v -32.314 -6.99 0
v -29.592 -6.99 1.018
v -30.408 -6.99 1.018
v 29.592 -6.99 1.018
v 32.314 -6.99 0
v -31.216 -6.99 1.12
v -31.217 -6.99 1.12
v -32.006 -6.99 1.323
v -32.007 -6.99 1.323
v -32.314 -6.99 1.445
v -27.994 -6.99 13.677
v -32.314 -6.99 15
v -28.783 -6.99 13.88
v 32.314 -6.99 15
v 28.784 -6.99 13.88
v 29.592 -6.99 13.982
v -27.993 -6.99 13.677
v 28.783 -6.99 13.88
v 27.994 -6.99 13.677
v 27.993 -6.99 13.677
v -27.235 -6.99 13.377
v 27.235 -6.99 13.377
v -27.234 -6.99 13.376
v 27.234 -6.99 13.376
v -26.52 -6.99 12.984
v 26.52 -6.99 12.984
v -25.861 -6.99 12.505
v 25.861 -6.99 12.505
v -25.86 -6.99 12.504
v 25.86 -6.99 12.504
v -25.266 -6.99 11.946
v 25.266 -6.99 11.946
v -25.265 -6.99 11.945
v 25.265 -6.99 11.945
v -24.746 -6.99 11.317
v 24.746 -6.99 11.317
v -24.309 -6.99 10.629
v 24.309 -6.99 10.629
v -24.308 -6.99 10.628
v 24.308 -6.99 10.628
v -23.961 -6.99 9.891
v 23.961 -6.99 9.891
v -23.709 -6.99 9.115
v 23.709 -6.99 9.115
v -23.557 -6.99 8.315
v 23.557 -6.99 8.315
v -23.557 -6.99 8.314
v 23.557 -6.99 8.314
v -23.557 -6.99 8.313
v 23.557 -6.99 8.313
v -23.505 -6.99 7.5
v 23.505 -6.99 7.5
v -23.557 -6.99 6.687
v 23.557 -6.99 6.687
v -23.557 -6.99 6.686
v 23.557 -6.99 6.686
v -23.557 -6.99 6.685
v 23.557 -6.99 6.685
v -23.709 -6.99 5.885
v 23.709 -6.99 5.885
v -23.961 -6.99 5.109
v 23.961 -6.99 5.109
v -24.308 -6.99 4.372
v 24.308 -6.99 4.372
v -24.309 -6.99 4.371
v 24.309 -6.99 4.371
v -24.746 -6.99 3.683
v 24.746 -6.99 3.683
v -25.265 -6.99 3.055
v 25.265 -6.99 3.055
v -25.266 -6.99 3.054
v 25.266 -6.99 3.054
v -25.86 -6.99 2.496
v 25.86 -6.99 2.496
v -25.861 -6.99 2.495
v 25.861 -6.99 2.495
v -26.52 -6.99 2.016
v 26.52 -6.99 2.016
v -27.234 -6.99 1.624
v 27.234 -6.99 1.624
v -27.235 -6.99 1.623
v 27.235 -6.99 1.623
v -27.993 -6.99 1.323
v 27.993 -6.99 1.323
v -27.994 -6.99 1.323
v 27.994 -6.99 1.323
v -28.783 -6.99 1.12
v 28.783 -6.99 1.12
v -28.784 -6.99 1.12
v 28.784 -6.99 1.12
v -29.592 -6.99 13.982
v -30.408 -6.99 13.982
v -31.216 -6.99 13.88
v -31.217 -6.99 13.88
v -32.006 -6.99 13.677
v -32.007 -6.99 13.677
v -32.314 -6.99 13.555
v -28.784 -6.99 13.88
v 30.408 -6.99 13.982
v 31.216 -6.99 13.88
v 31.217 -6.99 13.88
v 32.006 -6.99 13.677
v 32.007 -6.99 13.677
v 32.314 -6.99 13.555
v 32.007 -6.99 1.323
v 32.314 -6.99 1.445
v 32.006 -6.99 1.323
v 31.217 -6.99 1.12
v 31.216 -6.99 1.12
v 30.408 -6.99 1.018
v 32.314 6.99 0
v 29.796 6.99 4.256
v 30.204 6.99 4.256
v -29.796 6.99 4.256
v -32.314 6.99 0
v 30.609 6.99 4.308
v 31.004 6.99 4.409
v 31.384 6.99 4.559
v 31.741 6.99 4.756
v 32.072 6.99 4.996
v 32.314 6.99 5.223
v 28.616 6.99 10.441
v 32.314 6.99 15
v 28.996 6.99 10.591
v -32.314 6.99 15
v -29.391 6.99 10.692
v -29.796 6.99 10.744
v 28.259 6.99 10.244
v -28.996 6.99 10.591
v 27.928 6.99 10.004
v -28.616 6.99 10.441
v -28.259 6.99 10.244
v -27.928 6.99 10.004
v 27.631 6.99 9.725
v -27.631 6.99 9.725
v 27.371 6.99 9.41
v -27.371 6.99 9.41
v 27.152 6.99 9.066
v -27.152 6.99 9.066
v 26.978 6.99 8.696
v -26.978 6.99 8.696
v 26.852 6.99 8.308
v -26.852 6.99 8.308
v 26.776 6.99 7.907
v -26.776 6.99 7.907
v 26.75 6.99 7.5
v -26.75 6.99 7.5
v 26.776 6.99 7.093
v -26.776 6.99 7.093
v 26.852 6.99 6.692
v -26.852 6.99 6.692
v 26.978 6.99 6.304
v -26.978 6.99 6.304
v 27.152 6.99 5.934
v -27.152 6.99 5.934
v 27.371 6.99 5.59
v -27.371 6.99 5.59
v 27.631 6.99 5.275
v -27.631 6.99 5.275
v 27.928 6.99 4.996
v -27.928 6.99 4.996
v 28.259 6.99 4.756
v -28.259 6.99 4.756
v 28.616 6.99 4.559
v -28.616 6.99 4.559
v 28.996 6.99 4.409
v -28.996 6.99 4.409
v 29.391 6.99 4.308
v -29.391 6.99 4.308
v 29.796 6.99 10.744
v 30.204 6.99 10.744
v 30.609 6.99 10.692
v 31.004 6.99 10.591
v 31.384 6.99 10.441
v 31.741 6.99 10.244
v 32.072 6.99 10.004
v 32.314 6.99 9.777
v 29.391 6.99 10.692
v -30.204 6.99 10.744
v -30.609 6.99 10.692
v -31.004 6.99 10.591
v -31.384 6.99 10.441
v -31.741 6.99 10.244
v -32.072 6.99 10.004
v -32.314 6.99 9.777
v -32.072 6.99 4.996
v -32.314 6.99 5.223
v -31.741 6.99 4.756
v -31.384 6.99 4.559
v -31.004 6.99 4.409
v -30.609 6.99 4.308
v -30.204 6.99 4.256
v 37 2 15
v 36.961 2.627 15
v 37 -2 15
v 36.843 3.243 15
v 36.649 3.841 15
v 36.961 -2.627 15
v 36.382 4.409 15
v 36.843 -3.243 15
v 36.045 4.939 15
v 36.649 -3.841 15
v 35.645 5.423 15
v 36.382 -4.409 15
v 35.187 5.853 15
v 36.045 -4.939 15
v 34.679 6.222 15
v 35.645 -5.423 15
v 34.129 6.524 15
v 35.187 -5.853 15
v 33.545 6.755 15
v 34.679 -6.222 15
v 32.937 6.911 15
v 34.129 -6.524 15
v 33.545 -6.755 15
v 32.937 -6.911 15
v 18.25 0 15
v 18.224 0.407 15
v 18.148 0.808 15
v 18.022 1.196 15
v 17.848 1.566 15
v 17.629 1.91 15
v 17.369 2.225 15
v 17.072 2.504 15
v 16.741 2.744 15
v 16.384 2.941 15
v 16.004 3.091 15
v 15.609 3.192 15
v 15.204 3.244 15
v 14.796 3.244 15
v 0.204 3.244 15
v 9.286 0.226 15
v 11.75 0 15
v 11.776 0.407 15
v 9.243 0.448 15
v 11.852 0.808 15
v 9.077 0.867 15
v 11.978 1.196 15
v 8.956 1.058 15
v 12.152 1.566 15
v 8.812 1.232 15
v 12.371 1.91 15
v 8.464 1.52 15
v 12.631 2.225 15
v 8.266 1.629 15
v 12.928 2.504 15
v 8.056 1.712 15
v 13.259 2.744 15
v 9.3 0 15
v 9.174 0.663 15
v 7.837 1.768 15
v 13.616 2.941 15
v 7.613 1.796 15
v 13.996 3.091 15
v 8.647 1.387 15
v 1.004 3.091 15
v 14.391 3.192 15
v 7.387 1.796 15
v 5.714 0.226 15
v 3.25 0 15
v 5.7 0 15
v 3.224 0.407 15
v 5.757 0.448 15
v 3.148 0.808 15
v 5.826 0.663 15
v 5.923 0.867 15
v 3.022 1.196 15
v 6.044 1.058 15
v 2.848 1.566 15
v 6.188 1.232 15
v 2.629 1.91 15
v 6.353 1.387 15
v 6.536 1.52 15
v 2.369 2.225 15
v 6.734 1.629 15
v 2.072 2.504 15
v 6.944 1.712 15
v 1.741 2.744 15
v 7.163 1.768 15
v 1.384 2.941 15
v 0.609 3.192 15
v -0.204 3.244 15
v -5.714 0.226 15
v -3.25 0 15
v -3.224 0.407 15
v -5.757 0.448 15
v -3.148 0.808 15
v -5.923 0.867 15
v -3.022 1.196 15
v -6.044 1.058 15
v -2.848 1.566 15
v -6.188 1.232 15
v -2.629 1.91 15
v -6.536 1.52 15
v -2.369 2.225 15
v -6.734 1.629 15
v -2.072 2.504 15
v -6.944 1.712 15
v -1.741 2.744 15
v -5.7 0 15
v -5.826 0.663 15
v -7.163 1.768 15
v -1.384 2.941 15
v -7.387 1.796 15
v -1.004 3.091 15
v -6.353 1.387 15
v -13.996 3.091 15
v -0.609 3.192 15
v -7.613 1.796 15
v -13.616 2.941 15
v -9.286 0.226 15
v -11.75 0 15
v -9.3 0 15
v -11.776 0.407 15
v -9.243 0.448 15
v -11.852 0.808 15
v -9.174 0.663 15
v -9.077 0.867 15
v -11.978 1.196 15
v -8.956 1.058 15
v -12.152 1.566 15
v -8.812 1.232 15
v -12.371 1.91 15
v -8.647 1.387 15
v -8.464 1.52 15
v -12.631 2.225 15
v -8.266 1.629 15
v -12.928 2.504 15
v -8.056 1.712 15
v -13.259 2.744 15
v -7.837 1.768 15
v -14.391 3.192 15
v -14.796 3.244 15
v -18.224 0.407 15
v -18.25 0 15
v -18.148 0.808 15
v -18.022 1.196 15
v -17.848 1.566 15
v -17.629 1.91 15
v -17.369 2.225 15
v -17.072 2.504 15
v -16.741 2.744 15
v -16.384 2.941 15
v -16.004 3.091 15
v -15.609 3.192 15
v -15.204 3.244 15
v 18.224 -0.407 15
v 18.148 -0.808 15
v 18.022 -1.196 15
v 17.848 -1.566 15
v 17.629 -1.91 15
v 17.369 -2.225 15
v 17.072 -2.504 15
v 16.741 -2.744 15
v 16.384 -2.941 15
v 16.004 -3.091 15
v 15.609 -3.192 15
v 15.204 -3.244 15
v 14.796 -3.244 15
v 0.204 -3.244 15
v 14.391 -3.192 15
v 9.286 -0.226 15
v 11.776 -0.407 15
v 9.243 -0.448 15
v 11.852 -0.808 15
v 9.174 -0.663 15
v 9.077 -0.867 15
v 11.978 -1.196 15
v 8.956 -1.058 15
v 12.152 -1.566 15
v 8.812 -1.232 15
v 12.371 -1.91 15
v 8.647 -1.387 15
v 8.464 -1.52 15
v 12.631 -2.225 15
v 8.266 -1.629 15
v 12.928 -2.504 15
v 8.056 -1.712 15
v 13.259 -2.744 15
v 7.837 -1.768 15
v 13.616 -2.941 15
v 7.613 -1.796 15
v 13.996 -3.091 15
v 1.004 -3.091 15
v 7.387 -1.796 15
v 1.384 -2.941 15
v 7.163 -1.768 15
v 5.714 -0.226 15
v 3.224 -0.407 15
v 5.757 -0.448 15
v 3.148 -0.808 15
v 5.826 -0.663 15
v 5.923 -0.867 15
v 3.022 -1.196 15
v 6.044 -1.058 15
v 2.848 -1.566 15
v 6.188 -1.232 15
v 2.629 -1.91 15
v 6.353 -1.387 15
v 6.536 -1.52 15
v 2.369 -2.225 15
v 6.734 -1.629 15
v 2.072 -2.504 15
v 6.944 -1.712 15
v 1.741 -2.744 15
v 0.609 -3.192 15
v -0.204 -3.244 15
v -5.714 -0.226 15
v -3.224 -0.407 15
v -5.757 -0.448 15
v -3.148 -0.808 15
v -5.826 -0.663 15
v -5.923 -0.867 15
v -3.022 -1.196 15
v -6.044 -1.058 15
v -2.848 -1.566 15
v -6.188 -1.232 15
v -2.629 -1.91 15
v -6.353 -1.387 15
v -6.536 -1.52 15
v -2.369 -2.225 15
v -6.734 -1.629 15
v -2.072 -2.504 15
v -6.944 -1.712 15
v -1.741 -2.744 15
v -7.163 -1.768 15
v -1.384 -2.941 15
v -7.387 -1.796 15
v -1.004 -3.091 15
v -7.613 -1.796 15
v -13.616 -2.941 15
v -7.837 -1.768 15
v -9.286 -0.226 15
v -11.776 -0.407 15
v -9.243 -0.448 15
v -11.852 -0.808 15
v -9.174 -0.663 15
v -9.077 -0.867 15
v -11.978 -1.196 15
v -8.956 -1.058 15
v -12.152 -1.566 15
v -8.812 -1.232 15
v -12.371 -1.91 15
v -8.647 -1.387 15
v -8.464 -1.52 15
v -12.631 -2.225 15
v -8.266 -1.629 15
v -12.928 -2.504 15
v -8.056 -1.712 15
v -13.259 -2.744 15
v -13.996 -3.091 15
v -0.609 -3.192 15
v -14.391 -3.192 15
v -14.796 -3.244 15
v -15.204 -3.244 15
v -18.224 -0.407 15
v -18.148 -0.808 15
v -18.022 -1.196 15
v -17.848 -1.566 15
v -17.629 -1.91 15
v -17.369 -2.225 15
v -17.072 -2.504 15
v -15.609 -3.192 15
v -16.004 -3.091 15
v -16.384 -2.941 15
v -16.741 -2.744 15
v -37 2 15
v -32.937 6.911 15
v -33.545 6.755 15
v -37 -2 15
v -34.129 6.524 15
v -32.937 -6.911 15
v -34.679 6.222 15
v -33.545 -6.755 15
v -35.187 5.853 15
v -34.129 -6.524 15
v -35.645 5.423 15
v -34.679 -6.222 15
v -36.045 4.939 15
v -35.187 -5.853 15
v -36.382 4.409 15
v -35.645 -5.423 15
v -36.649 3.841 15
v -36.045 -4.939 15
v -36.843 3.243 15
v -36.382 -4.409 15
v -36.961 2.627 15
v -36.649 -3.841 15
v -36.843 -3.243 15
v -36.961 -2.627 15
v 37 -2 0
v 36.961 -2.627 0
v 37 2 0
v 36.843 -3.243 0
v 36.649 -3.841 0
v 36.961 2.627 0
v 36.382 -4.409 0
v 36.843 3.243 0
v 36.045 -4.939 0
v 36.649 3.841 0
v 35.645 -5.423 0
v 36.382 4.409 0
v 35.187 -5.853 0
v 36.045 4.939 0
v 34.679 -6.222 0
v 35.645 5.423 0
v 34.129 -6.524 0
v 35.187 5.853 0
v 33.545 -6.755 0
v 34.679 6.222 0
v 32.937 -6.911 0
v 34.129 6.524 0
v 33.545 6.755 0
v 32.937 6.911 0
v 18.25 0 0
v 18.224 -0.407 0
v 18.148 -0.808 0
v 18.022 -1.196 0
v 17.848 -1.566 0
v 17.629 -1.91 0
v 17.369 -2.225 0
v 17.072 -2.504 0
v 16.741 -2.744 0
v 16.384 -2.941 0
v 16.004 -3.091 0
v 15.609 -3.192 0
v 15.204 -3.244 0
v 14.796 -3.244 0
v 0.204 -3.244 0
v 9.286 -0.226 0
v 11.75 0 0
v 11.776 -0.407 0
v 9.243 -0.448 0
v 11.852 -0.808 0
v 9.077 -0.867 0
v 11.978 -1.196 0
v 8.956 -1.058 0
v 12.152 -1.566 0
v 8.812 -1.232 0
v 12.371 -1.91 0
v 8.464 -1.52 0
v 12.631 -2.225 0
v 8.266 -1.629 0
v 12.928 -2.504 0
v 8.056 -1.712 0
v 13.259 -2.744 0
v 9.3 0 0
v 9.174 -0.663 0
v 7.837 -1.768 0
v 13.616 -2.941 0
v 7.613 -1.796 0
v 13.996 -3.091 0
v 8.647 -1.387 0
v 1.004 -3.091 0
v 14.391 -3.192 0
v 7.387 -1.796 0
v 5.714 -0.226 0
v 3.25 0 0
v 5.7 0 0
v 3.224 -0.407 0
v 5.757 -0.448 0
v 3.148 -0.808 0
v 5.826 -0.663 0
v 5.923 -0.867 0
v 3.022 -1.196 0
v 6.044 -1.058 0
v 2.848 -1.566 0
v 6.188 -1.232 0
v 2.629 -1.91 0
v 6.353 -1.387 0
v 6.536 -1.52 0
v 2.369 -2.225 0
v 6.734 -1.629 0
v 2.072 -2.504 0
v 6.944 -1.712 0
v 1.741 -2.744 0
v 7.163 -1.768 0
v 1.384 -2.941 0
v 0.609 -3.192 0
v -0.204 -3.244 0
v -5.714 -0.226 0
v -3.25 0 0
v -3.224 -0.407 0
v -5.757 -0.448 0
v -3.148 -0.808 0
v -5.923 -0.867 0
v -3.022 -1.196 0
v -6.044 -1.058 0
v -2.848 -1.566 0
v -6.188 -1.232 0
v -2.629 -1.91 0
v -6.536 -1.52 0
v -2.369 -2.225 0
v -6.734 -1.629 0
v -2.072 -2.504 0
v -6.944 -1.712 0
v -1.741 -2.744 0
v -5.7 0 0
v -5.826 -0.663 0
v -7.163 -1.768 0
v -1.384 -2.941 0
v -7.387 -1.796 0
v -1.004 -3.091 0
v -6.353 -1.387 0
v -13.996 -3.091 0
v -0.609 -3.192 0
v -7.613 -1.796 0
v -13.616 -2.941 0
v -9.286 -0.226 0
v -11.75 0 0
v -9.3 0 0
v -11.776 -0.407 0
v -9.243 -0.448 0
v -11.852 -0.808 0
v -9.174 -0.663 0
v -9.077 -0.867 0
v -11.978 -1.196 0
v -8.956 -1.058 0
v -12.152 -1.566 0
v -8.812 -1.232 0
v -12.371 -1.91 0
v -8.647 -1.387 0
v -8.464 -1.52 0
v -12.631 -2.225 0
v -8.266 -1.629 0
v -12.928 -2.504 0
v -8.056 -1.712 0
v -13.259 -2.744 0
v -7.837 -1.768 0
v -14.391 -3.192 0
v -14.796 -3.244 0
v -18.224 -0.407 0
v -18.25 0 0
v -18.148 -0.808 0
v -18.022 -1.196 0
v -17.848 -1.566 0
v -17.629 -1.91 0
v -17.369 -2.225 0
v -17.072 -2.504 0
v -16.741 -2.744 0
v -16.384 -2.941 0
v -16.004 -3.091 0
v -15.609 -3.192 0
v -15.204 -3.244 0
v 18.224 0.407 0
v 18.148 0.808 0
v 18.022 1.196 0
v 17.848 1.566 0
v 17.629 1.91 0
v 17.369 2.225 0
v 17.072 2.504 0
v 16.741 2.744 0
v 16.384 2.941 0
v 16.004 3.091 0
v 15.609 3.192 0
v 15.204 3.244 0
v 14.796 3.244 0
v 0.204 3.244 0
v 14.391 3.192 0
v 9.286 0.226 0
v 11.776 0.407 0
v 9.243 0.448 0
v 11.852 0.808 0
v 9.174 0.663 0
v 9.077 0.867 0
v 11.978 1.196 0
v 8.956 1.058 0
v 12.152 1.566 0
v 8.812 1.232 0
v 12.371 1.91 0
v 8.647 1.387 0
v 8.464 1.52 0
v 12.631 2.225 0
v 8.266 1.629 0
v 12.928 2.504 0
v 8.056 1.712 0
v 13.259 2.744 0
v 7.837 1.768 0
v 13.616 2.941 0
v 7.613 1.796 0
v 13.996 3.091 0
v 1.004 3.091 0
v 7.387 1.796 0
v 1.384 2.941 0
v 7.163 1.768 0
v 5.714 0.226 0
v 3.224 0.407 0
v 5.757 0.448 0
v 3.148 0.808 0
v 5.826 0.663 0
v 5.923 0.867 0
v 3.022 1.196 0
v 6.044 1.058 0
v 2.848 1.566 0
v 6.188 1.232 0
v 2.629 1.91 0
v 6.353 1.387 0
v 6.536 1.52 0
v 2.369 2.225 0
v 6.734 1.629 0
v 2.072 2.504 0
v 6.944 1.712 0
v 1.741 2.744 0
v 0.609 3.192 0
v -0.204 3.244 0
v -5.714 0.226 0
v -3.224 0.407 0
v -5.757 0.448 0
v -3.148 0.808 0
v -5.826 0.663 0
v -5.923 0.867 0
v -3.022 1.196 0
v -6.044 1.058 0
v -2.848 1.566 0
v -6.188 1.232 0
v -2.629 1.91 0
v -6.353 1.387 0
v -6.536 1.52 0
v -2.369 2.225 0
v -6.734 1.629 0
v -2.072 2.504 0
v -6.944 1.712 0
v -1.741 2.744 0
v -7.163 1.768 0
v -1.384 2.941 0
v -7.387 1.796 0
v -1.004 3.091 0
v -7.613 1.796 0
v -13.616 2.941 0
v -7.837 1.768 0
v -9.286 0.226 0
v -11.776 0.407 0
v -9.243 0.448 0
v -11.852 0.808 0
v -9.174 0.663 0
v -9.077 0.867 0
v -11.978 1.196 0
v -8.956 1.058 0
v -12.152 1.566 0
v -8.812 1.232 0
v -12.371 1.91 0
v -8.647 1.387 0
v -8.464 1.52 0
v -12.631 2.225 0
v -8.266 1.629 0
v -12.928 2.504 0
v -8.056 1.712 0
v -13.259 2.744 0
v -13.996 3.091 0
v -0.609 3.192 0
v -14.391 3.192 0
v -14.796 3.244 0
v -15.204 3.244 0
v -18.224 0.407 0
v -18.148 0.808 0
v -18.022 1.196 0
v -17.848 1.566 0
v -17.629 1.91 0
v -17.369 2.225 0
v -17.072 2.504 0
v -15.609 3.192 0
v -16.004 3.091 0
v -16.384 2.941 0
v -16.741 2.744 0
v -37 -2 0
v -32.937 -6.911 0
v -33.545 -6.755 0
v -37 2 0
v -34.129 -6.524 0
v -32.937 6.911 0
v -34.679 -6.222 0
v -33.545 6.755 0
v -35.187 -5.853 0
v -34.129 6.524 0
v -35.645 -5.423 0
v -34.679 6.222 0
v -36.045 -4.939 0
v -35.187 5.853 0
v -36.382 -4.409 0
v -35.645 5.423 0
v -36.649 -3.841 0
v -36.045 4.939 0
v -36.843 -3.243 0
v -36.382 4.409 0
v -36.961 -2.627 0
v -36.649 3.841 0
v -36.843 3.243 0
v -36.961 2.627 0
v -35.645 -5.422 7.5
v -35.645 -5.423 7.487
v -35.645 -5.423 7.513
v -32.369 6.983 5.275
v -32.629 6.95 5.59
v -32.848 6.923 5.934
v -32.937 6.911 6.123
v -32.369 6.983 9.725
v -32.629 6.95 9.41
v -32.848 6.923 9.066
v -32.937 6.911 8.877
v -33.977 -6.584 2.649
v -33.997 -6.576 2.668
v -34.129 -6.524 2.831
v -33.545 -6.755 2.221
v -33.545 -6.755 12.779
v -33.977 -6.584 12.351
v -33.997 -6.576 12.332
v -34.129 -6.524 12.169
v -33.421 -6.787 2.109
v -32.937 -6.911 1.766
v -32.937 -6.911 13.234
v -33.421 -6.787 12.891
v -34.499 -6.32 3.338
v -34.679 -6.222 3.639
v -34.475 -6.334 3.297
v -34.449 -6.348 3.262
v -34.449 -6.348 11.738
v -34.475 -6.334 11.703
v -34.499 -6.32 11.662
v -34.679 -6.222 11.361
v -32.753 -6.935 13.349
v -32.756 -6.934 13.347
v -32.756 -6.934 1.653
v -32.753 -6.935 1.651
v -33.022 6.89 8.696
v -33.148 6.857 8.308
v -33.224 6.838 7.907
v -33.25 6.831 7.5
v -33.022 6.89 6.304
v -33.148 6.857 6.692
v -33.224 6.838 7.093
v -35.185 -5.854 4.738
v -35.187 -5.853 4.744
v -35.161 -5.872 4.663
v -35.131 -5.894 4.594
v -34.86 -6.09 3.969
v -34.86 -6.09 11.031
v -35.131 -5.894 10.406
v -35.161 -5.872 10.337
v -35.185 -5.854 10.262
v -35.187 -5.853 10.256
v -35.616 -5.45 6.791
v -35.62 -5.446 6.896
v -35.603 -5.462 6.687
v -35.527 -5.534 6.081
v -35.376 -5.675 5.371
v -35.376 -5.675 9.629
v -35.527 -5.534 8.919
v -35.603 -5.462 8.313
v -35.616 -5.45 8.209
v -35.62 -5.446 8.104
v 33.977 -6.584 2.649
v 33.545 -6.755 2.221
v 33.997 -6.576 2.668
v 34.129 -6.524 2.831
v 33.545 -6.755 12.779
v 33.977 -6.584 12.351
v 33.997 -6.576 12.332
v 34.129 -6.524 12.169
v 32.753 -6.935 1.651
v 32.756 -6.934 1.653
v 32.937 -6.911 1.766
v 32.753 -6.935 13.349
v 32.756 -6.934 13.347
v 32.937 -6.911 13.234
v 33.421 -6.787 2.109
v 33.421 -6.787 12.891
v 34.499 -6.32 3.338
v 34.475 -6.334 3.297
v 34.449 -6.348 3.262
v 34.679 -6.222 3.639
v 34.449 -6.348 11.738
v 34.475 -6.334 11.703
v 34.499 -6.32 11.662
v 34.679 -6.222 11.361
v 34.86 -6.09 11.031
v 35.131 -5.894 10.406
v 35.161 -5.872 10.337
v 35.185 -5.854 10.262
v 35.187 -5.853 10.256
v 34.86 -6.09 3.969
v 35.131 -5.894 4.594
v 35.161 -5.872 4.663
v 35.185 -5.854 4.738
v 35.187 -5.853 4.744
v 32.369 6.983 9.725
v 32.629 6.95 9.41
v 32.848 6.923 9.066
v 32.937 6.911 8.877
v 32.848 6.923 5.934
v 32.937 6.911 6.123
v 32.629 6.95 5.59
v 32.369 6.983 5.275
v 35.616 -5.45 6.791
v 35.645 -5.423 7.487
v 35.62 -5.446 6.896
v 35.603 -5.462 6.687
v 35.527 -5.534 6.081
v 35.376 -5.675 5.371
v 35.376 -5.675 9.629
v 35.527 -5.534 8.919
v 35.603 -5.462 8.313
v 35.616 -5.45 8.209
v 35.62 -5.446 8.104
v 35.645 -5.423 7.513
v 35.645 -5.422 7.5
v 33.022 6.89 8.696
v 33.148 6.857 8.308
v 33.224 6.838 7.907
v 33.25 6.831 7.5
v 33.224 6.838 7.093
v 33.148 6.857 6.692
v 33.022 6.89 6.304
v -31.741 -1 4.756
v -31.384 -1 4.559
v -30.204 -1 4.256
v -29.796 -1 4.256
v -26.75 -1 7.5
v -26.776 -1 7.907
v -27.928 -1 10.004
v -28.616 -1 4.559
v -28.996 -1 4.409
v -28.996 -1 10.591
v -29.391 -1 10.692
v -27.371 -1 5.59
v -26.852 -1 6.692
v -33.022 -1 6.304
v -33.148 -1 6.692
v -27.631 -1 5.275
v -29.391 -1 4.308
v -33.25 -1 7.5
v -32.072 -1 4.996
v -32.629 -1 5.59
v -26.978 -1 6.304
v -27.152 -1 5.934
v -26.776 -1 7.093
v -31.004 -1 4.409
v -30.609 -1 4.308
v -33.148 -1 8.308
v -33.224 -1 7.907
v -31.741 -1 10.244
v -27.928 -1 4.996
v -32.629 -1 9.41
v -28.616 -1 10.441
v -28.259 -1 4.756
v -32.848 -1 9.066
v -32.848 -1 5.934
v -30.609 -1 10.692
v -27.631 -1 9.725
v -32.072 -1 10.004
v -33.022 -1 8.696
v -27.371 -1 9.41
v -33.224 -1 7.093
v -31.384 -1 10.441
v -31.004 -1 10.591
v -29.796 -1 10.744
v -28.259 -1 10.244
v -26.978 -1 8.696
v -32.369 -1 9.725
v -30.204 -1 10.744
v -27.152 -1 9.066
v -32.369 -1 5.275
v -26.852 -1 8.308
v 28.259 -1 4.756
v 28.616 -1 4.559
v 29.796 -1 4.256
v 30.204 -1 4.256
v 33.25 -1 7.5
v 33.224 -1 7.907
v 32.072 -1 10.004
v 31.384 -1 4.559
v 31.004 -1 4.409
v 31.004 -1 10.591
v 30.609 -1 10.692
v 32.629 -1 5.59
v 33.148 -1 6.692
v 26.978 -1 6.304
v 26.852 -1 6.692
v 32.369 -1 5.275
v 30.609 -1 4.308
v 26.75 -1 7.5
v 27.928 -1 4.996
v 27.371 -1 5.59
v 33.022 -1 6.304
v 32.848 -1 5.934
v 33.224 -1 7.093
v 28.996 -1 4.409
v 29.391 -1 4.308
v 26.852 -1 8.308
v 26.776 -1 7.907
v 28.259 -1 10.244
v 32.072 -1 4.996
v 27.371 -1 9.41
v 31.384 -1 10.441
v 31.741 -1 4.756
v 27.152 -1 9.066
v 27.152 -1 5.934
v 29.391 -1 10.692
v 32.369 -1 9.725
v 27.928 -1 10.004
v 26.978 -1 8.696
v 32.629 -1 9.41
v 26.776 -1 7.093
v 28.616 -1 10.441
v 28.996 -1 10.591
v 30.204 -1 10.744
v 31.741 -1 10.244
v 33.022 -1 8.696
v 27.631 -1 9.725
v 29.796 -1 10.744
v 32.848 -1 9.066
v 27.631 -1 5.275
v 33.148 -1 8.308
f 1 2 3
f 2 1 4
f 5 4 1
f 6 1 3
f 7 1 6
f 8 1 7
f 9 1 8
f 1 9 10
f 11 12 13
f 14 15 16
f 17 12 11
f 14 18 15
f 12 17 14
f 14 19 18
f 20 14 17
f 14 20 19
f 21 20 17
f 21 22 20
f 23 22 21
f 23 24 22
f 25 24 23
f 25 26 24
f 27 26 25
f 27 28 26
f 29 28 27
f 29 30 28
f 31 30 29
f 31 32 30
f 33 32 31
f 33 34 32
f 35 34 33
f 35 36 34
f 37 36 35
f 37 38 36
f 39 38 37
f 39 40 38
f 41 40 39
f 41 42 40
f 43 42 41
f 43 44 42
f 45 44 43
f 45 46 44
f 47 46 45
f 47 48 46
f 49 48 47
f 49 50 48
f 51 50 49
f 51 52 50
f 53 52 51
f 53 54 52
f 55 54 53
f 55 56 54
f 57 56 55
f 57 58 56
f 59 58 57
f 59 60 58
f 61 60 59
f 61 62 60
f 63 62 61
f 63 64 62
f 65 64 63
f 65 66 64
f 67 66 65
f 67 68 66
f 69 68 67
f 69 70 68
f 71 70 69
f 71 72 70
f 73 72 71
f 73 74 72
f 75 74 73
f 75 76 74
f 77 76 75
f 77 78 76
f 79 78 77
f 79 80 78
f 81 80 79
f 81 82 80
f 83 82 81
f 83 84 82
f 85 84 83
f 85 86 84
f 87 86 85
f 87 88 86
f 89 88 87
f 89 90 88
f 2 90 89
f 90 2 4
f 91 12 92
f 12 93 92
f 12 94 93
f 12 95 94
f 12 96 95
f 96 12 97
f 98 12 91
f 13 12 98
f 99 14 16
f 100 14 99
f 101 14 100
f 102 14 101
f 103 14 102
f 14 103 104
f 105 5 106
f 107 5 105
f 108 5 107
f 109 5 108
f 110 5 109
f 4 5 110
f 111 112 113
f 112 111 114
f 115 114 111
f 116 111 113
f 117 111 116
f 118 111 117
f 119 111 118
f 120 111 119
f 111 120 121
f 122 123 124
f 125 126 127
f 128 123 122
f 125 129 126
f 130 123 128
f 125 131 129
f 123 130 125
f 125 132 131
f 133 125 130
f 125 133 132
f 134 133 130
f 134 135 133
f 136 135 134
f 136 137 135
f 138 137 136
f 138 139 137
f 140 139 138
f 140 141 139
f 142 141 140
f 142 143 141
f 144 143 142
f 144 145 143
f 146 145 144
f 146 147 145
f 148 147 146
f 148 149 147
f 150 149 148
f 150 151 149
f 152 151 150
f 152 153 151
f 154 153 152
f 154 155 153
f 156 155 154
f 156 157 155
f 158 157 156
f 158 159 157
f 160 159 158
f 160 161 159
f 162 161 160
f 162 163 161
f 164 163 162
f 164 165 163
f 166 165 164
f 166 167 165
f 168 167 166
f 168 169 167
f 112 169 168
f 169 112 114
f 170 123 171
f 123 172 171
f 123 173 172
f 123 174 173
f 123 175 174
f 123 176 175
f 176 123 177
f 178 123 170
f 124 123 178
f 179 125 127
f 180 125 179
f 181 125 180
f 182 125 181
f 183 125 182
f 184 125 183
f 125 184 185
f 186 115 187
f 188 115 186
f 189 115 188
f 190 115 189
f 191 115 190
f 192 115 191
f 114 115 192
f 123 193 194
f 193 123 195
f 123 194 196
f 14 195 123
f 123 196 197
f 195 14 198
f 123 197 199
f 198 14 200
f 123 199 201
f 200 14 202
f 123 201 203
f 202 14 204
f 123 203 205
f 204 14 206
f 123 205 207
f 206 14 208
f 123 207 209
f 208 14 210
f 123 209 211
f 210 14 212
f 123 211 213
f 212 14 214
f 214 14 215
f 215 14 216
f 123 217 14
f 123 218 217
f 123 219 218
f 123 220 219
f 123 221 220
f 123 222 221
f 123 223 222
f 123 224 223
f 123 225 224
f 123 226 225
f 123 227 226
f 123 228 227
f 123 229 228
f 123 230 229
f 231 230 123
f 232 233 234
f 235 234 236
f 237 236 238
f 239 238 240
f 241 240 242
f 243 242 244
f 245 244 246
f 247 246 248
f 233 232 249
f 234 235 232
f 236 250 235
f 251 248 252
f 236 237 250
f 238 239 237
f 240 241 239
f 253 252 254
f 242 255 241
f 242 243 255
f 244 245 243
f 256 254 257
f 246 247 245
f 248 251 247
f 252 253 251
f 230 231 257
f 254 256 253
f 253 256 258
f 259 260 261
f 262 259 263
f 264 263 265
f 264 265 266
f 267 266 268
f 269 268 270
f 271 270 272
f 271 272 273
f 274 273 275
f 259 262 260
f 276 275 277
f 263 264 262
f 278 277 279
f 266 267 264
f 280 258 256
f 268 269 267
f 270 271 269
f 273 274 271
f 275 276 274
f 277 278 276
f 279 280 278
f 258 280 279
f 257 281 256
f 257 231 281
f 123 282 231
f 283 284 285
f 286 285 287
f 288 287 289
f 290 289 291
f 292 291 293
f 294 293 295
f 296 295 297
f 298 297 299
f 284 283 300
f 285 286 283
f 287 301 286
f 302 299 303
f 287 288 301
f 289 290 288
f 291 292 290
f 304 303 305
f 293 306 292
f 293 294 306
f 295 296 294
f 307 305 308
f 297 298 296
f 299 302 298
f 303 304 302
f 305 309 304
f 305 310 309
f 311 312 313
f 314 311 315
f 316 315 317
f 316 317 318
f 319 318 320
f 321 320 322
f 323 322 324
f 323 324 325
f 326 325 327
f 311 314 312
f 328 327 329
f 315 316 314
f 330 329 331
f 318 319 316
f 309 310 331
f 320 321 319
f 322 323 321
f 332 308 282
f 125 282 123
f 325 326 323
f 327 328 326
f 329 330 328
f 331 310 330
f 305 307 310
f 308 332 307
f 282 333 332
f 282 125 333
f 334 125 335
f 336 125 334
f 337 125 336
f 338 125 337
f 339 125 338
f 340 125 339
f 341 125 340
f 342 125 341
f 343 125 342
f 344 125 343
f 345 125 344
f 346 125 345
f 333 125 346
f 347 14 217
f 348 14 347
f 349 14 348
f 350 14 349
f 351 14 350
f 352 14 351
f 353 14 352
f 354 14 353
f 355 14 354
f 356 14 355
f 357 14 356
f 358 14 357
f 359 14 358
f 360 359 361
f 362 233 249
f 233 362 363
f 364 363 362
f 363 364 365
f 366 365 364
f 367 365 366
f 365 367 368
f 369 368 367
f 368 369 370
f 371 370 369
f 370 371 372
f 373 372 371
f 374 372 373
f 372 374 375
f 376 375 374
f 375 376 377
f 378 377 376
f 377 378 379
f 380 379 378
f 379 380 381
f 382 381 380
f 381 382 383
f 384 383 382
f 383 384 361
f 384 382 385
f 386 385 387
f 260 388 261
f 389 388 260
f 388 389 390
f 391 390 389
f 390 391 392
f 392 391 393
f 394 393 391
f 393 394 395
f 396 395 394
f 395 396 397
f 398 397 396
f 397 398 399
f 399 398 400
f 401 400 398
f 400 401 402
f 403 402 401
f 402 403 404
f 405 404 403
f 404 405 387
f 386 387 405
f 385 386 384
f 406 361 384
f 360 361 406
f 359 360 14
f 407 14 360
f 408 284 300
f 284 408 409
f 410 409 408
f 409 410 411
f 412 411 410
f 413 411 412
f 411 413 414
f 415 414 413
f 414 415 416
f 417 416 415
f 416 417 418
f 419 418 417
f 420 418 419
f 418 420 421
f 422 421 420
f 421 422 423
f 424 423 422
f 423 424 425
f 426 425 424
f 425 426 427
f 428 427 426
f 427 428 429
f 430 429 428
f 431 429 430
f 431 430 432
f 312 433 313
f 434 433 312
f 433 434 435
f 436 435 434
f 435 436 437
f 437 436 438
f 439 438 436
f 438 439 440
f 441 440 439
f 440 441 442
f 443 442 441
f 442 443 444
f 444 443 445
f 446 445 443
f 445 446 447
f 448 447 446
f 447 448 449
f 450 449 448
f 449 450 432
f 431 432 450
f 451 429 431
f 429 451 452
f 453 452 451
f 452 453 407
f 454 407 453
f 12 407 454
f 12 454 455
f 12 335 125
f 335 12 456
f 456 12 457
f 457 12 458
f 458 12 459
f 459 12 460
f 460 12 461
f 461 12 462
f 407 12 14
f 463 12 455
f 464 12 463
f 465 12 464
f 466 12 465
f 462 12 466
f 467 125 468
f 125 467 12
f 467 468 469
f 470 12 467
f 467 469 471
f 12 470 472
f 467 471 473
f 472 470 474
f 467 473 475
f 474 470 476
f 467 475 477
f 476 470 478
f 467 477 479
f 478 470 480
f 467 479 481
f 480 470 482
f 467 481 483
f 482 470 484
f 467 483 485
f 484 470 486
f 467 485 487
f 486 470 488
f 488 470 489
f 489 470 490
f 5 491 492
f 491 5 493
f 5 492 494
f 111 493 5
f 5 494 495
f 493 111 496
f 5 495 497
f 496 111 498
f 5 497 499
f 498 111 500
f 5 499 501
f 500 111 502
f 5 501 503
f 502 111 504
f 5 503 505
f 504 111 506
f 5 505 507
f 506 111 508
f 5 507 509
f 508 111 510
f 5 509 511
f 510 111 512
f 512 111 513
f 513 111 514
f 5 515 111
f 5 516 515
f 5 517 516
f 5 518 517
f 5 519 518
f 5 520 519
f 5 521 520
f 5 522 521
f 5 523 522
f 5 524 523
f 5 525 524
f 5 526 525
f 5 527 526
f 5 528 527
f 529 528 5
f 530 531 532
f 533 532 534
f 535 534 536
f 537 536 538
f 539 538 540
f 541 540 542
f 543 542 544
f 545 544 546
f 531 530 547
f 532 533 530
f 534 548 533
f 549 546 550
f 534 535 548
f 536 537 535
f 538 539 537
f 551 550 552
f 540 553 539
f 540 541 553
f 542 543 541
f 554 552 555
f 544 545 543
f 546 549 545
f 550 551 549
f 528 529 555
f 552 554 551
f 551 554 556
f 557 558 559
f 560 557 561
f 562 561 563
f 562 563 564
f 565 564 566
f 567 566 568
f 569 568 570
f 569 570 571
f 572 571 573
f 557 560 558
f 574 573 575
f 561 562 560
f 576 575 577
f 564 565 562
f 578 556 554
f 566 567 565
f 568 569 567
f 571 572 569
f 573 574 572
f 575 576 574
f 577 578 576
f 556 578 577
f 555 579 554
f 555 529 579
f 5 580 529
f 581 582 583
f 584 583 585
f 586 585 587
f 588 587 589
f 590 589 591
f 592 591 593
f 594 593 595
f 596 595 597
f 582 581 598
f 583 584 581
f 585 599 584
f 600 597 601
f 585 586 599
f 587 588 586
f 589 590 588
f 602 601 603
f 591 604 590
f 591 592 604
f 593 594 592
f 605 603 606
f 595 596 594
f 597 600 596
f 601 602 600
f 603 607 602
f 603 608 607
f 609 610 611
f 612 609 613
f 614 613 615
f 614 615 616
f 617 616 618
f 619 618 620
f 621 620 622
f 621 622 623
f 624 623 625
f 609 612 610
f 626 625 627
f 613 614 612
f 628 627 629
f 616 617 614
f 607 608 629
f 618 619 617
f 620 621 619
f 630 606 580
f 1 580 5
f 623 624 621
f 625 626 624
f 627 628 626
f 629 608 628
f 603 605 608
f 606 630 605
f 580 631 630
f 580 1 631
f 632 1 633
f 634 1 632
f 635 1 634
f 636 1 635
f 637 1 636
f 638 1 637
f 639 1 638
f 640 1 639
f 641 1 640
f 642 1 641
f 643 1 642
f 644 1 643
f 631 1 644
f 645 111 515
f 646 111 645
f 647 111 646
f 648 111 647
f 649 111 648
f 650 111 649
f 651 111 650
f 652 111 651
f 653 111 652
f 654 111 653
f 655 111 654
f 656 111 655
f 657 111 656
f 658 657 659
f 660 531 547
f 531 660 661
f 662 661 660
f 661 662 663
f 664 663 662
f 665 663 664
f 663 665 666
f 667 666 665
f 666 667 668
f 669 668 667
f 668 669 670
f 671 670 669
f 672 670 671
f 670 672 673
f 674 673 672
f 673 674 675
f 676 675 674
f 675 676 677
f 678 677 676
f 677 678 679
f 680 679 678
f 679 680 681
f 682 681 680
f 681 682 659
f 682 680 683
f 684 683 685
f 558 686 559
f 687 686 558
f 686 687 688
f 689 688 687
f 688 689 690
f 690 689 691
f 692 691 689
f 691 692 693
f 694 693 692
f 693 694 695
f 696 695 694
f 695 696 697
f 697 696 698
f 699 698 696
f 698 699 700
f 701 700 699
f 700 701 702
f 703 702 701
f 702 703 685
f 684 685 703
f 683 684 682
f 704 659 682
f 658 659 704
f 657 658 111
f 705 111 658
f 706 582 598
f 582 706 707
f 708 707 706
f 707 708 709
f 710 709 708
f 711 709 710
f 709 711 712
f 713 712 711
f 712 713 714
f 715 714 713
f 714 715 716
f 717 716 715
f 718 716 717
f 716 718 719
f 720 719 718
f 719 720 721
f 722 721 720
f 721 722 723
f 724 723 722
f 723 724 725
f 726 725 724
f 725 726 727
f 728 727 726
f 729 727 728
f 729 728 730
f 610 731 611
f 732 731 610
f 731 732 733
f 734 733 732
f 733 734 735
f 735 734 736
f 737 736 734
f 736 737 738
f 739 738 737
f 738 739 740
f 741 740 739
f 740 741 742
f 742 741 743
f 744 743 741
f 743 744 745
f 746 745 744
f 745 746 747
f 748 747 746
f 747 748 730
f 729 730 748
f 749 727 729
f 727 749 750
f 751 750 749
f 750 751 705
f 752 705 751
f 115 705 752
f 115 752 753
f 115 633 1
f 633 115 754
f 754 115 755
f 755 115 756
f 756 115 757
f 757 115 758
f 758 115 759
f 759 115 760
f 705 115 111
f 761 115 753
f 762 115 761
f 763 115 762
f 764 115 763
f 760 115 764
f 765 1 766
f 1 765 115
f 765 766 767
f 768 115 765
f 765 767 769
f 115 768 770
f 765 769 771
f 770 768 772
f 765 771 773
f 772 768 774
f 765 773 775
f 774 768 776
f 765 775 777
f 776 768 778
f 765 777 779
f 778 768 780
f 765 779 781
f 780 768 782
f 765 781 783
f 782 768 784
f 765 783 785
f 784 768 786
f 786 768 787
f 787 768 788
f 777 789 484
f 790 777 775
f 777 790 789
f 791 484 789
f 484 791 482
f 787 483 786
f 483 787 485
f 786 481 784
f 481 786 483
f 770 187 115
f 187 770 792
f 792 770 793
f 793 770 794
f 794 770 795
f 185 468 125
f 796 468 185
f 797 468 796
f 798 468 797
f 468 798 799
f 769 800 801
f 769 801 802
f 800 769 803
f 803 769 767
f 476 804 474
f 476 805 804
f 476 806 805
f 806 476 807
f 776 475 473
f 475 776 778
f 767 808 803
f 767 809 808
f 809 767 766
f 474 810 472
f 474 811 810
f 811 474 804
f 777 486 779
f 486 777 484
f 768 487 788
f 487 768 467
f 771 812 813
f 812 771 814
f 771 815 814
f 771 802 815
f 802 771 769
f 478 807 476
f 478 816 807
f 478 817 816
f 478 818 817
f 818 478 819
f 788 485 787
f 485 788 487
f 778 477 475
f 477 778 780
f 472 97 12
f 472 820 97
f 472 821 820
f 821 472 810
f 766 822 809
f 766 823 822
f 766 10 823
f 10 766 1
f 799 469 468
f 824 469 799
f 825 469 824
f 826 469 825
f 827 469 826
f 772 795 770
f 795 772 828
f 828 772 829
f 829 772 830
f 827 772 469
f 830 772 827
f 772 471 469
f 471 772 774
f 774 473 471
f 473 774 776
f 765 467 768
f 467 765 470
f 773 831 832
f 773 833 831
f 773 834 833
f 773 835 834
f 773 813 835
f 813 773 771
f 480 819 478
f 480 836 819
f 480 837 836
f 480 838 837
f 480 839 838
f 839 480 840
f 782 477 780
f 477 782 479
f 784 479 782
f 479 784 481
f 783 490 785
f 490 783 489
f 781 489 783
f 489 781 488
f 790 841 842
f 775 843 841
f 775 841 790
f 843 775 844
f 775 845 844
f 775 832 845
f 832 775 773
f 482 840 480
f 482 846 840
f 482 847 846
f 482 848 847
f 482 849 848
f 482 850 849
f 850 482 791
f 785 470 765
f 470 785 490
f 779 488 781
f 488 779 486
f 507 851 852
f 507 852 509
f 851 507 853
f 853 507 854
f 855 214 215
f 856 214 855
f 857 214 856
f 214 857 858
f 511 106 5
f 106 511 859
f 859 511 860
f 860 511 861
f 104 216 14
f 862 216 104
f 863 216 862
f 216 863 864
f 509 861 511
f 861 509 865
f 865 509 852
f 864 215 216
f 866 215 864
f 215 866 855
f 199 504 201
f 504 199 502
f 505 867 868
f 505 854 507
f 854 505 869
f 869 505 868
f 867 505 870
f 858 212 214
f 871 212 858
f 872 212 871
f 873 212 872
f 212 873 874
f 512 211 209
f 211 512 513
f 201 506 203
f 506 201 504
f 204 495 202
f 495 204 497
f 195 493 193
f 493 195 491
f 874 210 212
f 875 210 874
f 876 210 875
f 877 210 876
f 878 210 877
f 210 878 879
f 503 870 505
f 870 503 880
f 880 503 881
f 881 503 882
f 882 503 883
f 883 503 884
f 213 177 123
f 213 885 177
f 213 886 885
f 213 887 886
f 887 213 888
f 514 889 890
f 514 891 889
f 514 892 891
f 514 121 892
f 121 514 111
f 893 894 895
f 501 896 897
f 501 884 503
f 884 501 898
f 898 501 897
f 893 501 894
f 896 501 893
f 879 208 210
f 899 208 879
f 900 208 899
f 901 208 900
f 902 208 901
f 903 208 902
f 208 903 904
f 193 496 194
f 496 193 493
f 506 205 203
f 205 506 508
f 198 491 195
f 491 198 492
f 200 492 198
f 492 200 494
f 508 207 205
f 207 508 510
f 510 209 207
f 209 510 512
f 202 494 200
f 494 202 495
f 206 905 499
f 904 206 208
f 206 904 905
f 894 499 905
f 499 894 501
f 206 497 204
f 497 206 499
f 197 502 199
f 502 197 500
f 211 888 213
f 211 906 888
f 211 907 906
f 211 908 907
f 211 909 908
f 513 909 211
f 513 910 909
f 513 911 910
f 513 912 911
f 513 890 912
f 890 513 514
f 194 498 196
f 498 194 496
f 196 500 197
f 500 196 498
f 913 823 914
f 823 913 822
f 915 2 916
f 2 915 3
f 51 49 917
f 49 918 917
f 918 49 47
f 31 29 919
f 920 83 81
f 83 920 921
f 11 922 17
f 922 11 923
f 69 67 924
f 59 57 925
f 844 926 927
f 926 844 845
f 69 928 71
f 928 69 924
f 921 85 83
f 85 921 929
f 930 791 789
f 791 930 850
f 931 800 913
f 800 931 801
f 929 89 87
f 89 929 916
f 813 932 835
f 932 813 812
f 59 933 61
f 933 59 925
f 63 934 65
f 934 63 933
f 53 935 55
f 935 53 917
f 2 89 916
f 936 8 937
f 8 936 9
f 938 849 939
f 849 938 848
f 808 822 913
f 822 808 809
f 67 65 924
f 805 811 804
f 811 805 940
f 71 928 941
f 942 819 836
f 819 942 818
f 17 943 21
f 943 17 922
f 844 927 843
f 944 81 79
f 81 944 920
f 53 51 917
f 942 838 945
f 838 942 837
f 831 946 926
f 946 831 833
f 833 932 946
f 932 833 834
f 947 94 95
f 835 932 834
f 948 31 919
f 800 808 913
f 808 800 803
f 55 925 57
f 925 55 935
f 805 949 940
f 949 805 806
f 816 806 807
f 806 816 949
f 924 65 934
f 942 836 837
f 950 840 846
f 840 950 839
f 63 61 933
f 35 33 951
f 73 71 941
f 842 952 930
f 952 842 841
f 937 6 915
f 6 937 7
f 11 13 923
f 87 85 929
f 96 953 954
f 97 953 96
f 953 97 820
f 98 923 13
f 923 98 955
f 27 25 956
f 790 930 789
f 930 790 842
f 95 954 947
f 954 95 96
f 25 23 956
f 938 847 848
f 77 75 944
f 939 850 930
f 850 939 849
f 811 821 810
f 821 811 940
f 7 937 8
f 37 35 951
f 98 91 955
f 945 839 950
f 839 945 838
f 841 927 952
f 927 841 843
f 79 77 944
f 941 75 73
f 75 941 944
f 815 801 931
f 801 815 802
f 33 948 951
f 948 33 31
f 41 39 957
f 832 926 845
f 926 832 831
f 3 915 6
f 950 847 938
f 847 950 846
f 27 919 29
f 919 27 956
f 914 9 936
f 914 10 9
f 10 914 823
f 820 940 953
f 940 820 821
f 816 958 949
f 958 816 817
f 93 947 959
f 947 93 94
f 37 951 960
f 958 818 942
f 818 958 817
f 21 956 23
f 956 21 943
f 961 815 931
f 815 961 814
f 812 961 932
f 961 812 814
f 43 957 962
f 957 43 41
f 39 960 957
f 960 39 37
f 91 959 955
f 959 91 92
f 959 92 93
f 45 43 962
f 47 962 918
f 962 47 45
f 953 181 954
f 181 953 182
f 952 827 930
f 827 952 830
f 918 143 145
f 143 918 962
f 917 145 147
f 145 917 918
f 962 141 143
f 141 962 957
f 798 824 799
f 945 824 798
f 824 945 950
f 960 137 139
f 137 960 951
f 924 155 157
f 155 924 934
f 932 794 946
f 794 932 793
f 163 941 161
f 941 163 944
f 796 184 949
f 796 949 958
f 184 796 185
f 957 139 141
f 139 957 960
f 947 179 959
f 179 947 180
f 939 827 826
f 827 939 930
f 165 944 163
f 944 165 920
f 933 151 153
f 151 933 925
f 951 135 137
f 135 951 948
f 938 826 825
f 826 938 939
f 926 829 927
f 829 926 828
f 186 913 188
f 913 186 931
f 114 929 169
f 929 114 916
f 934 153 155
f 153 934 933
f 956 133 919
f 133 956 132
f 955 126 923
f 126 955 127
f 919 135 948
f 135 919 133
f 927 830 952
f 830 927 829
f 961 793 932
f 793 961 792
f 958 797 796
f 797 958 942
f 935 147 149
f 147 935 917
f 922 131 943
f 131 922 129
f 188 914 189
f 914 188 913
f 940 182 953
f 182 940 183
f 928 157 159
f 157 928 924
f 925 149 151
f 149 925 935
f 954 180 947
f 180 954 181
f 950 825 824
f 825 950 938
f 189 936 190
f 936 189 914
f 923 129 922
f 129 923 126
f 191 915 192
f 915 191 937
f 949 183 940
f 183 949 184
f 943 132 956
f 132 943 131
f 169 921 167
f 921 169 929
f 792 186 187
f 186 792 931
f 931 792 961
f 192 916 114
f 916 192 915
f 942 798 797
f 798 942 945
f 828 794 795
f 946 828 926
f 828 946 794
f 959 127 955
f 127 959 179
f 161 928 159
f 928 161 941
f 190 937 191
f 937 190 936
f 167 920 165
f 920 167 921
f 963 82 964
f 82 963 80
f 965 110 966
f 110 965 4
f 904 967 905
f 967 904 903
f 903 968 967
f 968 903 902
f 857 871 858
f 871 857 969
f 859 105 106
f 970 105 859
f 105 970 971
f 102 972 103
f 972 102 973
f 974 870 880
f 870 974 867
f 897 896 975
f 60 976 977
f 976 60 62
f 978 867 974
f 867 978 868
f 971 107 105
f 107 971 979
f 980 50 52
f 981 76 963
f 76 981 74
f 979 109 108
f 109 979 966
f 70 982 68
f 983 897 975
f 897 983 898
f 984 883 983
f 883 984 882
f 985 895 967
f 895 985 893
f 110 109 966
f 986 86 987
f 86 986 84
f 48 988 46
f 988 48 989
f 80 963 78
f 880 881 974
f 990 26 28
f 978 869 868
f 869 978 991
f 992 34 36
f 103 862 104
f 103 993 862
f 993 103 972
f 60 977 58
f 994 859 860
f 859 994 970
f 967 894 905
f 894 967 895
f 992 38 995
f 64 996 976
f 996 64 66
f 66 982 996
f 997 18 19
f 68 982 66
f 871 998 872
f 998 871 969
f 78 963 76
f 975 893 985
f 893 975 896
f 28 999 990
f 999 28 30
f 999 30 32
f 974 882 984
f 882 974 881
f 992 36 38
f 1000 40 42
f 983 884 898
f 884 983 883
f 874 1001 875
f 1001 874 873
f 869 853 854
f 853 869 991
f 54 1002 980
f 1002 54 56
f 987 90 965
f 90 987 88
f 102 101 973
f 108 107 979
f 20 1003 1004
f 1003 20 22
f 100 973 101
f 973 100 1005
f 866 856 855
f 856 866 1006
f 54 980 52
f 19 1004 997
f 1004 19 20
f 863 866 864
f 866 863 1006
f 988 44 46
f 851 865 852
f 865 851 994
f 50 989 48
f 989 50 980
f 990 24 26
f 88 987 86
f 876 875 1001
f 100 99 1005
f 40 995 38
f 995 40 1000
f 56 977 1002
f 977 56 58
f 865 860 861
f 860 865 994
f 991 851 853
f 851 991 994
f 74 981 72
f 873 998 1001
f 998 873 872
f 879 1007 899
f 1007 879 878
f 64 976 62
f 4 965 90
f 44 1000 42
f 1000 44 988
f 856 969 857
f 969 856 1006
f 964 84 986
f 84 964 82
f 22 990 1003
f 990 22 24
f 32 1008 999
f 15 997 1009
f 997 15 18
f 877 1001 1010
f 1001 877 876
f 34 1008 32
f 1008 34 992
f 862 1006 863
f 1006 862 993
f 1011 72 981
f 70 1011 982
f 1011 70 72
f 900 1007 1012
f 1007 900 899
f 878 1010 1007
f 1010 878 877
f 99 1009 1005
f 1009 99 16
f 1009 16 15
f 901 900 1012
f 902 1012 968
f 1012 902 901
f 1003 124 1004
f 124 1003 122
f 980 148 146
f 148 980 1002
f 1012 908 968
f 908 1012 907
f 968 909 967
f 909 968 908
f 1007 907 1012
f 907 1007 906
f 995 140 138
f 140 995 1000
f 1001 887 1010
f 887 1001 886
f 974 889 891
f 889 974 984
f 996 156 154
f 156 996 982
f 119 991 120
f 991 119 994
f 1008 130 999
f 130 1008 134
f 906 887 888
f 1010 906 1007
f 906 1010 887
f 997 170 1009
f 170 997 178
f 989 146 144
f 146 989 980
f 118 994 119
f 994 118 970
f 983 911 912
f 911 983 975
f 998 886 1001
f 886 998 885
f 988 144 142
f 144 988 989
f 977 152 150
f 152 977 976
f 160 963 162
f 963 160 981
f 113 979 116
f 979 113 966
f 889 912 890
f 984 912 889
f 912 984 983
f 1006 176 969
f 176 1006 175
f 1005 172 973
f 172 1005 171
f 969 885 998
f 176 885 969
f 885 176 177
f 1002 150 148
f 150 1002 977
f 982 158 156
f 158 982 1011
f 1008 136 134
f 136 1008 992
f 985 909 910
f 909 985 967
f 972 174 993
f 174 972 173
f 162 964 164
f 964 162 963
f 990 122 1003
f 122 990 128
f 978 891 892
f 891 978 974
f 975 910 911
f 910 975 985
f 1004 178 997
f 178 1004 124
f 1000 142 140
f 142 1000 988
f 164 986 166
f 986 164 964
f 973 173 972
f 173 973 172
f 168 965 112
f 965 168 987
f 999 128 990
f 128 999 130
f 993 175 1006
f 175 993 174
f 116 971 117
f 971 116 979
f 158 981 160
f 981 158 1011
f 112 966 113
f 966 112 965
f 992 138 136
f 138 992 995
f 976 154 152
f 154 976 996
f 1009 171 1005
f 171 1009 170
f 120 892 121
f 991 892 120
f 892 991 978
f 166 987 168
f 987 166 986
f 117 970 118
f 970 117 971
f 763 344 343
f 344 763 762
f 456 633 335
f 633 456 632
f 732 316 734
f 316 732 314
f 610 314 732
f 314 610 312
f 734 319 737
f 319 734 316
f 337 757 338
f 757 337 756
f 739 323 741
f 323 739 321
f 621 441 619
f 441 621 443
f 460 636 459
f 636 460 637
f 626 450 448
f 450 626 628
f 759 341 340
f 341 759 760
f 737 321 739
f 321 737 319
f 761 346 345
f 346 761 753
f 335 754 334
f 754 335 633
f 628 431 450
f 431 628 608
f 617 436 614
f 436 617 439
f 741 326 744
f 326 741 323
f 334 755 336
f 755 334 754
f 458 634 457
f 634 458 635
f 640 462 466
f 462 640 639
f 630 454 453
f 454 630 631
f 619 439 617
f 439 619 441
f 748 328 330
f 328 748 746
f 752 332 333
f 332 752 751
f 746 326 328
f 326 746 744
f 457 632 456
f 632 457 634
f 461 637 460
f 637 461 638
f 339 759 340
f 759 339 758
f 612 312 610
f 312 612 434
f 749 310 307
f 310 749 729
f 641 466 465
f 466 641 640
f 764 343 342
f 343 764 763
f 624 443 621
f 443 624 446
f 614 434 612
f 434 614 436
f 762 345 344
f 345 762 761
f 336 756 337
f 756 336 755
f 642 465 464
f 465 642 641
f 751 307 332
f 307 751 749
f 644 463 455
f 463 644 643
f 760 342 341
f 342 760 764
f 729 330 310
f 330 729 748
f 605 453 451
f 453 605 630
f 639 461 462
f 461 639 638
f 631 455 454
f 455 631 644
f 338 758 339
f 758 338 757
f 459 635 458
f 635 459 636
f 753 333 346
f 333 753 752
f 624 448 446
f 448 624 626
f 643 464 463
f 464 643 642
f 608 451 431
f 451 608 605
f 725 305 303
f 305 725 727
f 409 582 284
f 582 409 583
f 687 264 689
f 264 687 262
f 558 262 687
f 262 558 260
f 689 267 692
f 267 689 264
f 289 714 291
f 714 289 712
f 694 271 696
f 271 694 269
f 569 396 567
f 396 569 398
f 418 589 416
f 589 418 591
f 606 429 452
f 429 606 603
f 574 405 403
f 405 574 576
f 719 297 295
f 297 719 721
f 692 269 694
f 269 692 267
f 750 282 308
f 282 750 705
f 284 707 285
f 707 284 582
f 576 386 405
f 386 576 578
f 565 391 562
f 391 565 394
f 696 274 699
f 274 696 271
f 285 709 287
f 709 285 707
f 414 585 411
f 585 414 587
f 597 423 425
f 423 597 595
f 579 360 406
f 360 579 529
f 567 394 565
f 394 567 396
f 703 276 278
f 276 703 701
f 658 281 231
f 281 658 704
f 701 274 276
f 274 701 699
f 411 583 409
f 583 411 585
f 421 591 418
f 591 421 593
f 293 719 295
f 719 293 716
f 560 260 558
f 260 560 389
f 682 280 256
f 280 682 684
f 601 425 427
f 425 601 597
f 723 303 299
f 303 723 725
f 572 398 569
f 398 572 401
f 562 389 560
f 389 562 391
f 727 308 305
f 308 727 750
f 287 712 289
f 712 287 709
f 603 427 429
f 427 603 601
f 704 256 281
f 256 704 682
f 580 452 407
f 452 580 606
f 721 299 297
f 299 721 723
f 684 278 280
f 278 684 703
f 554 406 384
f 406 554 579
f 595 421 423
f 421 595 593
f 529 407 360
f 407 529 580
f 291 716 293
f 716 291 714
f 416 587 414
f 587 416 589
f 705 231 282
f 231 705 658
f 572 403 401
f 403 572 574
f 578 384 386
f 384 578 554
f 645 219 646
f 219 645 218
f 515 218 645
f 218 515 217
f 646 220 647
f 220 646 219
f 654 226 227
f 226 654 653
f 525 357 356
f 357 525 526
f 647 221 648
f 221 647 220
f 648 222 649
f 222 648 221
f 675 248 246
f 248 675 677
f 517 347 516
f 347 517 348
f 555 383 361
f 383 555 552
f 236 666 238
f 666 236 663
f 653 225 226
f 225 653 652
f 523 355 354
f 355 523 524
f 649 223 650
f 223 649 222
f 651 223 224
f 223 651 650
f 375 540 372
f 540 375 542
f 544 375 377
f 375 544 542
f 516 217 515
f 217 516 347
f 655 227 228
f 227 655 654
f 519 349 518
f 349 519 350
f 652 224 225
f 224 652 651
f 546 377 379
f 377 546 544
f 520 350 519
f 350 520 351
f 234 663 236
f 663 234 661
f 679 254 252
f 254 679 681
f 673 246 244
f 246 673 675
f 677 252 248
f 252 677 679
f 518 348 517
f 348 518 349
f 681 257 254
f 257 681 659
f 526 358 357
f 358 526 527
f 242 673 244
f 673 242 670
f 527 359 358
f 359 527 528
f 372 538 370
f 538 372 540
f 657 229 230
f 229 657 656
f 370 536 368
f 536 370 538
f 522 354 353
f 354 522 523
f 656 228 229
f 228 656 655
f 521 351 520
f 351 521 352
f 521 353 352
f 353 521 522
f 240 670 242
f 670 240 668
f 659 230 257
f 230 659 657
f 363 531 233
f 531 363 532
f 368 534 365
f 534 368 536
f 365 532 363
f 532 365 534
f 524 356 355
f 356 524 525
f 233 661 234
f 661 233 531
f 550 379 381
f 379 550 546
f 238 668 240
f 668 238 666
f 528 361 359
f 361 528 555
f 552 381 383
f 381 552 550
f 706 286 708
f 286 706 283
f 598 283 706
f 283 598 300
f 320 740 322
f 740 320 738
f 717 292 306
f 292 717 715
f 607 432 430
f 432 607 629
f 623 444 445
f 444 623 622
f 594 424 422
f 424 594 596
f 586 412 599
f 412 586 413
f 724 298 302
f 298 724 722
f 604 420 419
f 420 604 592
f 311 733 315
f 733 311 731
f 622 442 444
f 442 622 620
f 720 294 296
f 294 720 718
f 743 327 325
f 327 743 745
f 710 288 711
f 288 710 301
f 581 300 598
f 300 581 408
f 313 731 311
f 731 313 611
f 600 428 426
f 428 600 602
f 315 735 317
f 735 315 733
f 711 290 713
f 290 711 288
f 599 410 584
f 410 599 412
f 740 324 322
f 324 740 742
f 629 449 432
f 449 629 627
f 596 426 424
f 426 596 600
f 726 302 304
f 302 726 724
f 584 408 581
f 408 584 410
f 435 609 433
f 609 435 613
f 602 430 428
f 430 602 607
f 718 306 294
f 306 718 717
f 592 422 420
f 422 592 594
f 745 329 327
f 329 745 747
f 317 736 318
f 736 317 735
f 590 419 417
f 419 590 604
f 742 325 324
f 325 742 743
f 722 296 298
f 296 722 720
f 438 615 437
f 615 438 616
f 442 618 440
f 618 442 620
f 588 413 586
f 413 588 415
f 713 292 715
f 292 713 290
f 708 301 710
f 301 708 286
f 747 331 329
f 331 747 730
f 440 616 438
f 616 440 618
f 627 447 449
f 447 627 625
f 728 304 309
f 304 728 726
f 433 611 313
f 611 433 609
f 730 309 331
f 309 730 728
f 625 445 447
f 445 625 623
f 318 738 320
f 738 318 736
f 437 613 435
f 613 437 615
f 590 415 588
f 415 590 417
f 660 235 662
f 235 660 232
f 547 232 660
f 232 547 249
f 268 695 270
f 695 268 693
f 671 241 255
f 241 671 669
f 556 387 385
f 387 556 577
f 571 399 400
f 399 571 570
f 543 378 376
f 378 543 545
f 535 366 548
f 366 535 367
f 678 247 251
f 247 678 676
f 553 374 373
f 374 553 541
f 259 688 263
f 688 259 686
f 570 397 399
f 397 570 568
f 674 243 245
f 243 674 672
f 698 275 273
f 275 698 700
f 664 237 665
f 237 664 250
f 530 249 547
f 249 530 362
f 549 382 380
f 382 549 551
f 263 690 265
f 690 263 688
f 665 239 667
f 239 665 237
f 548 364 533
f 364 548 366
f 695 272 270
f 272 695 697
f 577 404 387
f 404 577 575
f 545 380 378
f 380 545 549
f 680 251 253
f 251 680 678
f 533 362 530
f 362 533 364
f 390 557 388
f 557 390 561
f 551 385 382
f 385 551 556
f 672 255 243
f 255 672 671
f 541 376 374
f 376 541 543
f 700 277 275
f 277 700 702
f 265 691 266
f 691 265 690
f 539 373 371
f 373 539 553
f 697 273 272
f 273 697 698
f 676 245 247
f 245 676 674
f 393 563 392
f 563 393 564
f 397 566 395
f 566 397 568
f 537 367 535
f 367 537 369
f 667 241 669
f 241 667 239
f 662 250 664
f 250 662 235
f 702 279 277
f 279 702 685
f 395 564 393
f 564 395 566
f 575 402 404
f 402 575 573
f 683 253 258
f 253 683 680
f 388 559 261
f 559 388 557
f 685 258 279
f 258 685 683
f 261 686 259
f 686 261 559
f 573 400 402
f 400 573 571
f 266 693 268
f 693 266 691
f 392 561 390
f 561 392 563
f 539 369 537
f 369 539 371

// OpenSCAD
$fn = 50;


difference() {
	union() {
		hull() {
			translate(v = [-17.0000000000, 2.0000000000, 0]) {
				cylinder(h = 15, r = 5);
			}
			translate(v = [17.0000000000, 2.0000000000, 0]) {
				cylinder(h = 15, r = 5);
			}
			translate(v = [-17.0000000000, -2.0000000000, 0]) {
				cylinder(h = 15, r = 5);
			}
			translate(v = [17.0000000000, -2.0000000000, 0]) {
				cylinder(h = 15, r = 5);
			}
		}
		translate(v = [-22.5000000000, 0.0000000000, 0]) {
			hull() {
				translate(v = [-9.5000000000, 2.0000000000, 0]) {
					cylinder(h = 15, r = 5);
				}
				translate(v = [9.5000000000, 2.0000000000, 0]) {
					cylinder(h = 15, r = 5);
				}
				translate(v = [-9.5000000000, -2.0000000000, 0]) {
					cylinder(h = 15, r = 5);
				}
				translate(v = [9.5000000000, -2.0000000000, 0]) {
					cylinder(h = 15, r = 5);
				}
			}
		}
		translate(v = [22.5000000000, 0.0000000000, 0]) {
			hull() {
				translate(v = [-9.5000000000, 2.0000000000, 0]) {
					cylinder(h = 15, r = 5);
				}
				translate(v = [9.5000000000, 2.0000000000, 0]) {
					cylinder(h = 15, r = 5);
				}
				translate(v = [-9.5000000000, -2.0000000000, 0]) {
					cylinder(h = 15, r = 5);
				}
				translate(v = [9.5000000000, -2.0000000000, 0]) {
					cylinder(h = 15, r = 5);
				}
			}
		}
	}
	union() {
		translate(v = [-30.0000000000, -7.0000000000, 7.5000000000]) {
			rotate(a = [90, 0, 0]) {
				difference() {
					union() {
						#translate(v = [0, 0, -14.0000000000]) {
							cylinder(h = 14, r = 2.2500000000);
						}
						#translate(v = [0, 0, -6]) {
							cylinder(h = 6, r1 = 3.2500000000, r2 = 6.5000000000);
						}
						#translate(v = [0, 0, -14.0000000000]) {
							cylinder(h = 14, r = 3.2500000000);
						}
						#translate(v = [0, 0, -14.0000000000]) {
							cylinder(h = 14, r = 2.2500000000);
						}
					}
					union();
				}
			}
		}
		translate(v = [30.0000000000, -7.0000000000, 7.5000000000]) {
			rotate(a = [90, 0, 0]) {
				difference() {
					union() {
						#translate(v = [0, 0, -14.0000000000]) {
							cylinder(h = 14, r = 2.2500000000);
						}
						#translate(v = [0, 0, -6]) {
							cylinder(h = 6, r1 = 3.2500000000, r2 = 6.5000000000);
						}
						#translate(v = [0, 0, -14.0000000000]) {
							cylinder(h = 14, r = 3.2500000000);
						}
						#translate(v = [0, 0, -14.0000000000]) {
							cylinder(h = 14, r = 2.2500000000);
						}
					}
					union();
				}
			}
		}
		translate(v = [-15.0000000000, 0.0000000000, 0]) {
			translate(v = [0, 0, -100]) {
				cylinder(h = 200, r = 3.2500000000);
			}
		}
		translate(v = [0, 0, -100]) {
			cylinder(h = 200, r = 3.2500000000);
		}
		translate(v = [15.0000000000, 0.0000000000, 0]) {
			translate(v = [0, 0, -100]) {
				cylinder(h = 200, r = 3.2500000000);
			}
		}
		translate(v = [-15.0000000000, 0.0000000000, 0]) {
			translate(v = [0, 0, -100]) {
				cylinder(h = 200, r = 1.8000000000);
			}
		}
		translate(v = [-7.5000000000, 0.0000000000, 0]) {
			translate(v = [0, 0, -100]) {
				cylinder(h = 200, r = 1.8000000000);
			}
		}
		translate(v = [0, 0, -100]) {
			cylinder(h = 200, r = 1.8000000000);
		}
		translate(v = [7.5000000000, 0.0000000000, 0]) {
			translate(v = [0, 0, -100]) {
				cylinder(h = 200, r = 1.8000000000);
			}
		}
		translate(v = [15.0000000000, 0.0000000000, 0]) {
			translate(v = [0, 0, -100]) {
				cylinder(h = 200, r = 1.8000000000);
			}
		}
	}
}
